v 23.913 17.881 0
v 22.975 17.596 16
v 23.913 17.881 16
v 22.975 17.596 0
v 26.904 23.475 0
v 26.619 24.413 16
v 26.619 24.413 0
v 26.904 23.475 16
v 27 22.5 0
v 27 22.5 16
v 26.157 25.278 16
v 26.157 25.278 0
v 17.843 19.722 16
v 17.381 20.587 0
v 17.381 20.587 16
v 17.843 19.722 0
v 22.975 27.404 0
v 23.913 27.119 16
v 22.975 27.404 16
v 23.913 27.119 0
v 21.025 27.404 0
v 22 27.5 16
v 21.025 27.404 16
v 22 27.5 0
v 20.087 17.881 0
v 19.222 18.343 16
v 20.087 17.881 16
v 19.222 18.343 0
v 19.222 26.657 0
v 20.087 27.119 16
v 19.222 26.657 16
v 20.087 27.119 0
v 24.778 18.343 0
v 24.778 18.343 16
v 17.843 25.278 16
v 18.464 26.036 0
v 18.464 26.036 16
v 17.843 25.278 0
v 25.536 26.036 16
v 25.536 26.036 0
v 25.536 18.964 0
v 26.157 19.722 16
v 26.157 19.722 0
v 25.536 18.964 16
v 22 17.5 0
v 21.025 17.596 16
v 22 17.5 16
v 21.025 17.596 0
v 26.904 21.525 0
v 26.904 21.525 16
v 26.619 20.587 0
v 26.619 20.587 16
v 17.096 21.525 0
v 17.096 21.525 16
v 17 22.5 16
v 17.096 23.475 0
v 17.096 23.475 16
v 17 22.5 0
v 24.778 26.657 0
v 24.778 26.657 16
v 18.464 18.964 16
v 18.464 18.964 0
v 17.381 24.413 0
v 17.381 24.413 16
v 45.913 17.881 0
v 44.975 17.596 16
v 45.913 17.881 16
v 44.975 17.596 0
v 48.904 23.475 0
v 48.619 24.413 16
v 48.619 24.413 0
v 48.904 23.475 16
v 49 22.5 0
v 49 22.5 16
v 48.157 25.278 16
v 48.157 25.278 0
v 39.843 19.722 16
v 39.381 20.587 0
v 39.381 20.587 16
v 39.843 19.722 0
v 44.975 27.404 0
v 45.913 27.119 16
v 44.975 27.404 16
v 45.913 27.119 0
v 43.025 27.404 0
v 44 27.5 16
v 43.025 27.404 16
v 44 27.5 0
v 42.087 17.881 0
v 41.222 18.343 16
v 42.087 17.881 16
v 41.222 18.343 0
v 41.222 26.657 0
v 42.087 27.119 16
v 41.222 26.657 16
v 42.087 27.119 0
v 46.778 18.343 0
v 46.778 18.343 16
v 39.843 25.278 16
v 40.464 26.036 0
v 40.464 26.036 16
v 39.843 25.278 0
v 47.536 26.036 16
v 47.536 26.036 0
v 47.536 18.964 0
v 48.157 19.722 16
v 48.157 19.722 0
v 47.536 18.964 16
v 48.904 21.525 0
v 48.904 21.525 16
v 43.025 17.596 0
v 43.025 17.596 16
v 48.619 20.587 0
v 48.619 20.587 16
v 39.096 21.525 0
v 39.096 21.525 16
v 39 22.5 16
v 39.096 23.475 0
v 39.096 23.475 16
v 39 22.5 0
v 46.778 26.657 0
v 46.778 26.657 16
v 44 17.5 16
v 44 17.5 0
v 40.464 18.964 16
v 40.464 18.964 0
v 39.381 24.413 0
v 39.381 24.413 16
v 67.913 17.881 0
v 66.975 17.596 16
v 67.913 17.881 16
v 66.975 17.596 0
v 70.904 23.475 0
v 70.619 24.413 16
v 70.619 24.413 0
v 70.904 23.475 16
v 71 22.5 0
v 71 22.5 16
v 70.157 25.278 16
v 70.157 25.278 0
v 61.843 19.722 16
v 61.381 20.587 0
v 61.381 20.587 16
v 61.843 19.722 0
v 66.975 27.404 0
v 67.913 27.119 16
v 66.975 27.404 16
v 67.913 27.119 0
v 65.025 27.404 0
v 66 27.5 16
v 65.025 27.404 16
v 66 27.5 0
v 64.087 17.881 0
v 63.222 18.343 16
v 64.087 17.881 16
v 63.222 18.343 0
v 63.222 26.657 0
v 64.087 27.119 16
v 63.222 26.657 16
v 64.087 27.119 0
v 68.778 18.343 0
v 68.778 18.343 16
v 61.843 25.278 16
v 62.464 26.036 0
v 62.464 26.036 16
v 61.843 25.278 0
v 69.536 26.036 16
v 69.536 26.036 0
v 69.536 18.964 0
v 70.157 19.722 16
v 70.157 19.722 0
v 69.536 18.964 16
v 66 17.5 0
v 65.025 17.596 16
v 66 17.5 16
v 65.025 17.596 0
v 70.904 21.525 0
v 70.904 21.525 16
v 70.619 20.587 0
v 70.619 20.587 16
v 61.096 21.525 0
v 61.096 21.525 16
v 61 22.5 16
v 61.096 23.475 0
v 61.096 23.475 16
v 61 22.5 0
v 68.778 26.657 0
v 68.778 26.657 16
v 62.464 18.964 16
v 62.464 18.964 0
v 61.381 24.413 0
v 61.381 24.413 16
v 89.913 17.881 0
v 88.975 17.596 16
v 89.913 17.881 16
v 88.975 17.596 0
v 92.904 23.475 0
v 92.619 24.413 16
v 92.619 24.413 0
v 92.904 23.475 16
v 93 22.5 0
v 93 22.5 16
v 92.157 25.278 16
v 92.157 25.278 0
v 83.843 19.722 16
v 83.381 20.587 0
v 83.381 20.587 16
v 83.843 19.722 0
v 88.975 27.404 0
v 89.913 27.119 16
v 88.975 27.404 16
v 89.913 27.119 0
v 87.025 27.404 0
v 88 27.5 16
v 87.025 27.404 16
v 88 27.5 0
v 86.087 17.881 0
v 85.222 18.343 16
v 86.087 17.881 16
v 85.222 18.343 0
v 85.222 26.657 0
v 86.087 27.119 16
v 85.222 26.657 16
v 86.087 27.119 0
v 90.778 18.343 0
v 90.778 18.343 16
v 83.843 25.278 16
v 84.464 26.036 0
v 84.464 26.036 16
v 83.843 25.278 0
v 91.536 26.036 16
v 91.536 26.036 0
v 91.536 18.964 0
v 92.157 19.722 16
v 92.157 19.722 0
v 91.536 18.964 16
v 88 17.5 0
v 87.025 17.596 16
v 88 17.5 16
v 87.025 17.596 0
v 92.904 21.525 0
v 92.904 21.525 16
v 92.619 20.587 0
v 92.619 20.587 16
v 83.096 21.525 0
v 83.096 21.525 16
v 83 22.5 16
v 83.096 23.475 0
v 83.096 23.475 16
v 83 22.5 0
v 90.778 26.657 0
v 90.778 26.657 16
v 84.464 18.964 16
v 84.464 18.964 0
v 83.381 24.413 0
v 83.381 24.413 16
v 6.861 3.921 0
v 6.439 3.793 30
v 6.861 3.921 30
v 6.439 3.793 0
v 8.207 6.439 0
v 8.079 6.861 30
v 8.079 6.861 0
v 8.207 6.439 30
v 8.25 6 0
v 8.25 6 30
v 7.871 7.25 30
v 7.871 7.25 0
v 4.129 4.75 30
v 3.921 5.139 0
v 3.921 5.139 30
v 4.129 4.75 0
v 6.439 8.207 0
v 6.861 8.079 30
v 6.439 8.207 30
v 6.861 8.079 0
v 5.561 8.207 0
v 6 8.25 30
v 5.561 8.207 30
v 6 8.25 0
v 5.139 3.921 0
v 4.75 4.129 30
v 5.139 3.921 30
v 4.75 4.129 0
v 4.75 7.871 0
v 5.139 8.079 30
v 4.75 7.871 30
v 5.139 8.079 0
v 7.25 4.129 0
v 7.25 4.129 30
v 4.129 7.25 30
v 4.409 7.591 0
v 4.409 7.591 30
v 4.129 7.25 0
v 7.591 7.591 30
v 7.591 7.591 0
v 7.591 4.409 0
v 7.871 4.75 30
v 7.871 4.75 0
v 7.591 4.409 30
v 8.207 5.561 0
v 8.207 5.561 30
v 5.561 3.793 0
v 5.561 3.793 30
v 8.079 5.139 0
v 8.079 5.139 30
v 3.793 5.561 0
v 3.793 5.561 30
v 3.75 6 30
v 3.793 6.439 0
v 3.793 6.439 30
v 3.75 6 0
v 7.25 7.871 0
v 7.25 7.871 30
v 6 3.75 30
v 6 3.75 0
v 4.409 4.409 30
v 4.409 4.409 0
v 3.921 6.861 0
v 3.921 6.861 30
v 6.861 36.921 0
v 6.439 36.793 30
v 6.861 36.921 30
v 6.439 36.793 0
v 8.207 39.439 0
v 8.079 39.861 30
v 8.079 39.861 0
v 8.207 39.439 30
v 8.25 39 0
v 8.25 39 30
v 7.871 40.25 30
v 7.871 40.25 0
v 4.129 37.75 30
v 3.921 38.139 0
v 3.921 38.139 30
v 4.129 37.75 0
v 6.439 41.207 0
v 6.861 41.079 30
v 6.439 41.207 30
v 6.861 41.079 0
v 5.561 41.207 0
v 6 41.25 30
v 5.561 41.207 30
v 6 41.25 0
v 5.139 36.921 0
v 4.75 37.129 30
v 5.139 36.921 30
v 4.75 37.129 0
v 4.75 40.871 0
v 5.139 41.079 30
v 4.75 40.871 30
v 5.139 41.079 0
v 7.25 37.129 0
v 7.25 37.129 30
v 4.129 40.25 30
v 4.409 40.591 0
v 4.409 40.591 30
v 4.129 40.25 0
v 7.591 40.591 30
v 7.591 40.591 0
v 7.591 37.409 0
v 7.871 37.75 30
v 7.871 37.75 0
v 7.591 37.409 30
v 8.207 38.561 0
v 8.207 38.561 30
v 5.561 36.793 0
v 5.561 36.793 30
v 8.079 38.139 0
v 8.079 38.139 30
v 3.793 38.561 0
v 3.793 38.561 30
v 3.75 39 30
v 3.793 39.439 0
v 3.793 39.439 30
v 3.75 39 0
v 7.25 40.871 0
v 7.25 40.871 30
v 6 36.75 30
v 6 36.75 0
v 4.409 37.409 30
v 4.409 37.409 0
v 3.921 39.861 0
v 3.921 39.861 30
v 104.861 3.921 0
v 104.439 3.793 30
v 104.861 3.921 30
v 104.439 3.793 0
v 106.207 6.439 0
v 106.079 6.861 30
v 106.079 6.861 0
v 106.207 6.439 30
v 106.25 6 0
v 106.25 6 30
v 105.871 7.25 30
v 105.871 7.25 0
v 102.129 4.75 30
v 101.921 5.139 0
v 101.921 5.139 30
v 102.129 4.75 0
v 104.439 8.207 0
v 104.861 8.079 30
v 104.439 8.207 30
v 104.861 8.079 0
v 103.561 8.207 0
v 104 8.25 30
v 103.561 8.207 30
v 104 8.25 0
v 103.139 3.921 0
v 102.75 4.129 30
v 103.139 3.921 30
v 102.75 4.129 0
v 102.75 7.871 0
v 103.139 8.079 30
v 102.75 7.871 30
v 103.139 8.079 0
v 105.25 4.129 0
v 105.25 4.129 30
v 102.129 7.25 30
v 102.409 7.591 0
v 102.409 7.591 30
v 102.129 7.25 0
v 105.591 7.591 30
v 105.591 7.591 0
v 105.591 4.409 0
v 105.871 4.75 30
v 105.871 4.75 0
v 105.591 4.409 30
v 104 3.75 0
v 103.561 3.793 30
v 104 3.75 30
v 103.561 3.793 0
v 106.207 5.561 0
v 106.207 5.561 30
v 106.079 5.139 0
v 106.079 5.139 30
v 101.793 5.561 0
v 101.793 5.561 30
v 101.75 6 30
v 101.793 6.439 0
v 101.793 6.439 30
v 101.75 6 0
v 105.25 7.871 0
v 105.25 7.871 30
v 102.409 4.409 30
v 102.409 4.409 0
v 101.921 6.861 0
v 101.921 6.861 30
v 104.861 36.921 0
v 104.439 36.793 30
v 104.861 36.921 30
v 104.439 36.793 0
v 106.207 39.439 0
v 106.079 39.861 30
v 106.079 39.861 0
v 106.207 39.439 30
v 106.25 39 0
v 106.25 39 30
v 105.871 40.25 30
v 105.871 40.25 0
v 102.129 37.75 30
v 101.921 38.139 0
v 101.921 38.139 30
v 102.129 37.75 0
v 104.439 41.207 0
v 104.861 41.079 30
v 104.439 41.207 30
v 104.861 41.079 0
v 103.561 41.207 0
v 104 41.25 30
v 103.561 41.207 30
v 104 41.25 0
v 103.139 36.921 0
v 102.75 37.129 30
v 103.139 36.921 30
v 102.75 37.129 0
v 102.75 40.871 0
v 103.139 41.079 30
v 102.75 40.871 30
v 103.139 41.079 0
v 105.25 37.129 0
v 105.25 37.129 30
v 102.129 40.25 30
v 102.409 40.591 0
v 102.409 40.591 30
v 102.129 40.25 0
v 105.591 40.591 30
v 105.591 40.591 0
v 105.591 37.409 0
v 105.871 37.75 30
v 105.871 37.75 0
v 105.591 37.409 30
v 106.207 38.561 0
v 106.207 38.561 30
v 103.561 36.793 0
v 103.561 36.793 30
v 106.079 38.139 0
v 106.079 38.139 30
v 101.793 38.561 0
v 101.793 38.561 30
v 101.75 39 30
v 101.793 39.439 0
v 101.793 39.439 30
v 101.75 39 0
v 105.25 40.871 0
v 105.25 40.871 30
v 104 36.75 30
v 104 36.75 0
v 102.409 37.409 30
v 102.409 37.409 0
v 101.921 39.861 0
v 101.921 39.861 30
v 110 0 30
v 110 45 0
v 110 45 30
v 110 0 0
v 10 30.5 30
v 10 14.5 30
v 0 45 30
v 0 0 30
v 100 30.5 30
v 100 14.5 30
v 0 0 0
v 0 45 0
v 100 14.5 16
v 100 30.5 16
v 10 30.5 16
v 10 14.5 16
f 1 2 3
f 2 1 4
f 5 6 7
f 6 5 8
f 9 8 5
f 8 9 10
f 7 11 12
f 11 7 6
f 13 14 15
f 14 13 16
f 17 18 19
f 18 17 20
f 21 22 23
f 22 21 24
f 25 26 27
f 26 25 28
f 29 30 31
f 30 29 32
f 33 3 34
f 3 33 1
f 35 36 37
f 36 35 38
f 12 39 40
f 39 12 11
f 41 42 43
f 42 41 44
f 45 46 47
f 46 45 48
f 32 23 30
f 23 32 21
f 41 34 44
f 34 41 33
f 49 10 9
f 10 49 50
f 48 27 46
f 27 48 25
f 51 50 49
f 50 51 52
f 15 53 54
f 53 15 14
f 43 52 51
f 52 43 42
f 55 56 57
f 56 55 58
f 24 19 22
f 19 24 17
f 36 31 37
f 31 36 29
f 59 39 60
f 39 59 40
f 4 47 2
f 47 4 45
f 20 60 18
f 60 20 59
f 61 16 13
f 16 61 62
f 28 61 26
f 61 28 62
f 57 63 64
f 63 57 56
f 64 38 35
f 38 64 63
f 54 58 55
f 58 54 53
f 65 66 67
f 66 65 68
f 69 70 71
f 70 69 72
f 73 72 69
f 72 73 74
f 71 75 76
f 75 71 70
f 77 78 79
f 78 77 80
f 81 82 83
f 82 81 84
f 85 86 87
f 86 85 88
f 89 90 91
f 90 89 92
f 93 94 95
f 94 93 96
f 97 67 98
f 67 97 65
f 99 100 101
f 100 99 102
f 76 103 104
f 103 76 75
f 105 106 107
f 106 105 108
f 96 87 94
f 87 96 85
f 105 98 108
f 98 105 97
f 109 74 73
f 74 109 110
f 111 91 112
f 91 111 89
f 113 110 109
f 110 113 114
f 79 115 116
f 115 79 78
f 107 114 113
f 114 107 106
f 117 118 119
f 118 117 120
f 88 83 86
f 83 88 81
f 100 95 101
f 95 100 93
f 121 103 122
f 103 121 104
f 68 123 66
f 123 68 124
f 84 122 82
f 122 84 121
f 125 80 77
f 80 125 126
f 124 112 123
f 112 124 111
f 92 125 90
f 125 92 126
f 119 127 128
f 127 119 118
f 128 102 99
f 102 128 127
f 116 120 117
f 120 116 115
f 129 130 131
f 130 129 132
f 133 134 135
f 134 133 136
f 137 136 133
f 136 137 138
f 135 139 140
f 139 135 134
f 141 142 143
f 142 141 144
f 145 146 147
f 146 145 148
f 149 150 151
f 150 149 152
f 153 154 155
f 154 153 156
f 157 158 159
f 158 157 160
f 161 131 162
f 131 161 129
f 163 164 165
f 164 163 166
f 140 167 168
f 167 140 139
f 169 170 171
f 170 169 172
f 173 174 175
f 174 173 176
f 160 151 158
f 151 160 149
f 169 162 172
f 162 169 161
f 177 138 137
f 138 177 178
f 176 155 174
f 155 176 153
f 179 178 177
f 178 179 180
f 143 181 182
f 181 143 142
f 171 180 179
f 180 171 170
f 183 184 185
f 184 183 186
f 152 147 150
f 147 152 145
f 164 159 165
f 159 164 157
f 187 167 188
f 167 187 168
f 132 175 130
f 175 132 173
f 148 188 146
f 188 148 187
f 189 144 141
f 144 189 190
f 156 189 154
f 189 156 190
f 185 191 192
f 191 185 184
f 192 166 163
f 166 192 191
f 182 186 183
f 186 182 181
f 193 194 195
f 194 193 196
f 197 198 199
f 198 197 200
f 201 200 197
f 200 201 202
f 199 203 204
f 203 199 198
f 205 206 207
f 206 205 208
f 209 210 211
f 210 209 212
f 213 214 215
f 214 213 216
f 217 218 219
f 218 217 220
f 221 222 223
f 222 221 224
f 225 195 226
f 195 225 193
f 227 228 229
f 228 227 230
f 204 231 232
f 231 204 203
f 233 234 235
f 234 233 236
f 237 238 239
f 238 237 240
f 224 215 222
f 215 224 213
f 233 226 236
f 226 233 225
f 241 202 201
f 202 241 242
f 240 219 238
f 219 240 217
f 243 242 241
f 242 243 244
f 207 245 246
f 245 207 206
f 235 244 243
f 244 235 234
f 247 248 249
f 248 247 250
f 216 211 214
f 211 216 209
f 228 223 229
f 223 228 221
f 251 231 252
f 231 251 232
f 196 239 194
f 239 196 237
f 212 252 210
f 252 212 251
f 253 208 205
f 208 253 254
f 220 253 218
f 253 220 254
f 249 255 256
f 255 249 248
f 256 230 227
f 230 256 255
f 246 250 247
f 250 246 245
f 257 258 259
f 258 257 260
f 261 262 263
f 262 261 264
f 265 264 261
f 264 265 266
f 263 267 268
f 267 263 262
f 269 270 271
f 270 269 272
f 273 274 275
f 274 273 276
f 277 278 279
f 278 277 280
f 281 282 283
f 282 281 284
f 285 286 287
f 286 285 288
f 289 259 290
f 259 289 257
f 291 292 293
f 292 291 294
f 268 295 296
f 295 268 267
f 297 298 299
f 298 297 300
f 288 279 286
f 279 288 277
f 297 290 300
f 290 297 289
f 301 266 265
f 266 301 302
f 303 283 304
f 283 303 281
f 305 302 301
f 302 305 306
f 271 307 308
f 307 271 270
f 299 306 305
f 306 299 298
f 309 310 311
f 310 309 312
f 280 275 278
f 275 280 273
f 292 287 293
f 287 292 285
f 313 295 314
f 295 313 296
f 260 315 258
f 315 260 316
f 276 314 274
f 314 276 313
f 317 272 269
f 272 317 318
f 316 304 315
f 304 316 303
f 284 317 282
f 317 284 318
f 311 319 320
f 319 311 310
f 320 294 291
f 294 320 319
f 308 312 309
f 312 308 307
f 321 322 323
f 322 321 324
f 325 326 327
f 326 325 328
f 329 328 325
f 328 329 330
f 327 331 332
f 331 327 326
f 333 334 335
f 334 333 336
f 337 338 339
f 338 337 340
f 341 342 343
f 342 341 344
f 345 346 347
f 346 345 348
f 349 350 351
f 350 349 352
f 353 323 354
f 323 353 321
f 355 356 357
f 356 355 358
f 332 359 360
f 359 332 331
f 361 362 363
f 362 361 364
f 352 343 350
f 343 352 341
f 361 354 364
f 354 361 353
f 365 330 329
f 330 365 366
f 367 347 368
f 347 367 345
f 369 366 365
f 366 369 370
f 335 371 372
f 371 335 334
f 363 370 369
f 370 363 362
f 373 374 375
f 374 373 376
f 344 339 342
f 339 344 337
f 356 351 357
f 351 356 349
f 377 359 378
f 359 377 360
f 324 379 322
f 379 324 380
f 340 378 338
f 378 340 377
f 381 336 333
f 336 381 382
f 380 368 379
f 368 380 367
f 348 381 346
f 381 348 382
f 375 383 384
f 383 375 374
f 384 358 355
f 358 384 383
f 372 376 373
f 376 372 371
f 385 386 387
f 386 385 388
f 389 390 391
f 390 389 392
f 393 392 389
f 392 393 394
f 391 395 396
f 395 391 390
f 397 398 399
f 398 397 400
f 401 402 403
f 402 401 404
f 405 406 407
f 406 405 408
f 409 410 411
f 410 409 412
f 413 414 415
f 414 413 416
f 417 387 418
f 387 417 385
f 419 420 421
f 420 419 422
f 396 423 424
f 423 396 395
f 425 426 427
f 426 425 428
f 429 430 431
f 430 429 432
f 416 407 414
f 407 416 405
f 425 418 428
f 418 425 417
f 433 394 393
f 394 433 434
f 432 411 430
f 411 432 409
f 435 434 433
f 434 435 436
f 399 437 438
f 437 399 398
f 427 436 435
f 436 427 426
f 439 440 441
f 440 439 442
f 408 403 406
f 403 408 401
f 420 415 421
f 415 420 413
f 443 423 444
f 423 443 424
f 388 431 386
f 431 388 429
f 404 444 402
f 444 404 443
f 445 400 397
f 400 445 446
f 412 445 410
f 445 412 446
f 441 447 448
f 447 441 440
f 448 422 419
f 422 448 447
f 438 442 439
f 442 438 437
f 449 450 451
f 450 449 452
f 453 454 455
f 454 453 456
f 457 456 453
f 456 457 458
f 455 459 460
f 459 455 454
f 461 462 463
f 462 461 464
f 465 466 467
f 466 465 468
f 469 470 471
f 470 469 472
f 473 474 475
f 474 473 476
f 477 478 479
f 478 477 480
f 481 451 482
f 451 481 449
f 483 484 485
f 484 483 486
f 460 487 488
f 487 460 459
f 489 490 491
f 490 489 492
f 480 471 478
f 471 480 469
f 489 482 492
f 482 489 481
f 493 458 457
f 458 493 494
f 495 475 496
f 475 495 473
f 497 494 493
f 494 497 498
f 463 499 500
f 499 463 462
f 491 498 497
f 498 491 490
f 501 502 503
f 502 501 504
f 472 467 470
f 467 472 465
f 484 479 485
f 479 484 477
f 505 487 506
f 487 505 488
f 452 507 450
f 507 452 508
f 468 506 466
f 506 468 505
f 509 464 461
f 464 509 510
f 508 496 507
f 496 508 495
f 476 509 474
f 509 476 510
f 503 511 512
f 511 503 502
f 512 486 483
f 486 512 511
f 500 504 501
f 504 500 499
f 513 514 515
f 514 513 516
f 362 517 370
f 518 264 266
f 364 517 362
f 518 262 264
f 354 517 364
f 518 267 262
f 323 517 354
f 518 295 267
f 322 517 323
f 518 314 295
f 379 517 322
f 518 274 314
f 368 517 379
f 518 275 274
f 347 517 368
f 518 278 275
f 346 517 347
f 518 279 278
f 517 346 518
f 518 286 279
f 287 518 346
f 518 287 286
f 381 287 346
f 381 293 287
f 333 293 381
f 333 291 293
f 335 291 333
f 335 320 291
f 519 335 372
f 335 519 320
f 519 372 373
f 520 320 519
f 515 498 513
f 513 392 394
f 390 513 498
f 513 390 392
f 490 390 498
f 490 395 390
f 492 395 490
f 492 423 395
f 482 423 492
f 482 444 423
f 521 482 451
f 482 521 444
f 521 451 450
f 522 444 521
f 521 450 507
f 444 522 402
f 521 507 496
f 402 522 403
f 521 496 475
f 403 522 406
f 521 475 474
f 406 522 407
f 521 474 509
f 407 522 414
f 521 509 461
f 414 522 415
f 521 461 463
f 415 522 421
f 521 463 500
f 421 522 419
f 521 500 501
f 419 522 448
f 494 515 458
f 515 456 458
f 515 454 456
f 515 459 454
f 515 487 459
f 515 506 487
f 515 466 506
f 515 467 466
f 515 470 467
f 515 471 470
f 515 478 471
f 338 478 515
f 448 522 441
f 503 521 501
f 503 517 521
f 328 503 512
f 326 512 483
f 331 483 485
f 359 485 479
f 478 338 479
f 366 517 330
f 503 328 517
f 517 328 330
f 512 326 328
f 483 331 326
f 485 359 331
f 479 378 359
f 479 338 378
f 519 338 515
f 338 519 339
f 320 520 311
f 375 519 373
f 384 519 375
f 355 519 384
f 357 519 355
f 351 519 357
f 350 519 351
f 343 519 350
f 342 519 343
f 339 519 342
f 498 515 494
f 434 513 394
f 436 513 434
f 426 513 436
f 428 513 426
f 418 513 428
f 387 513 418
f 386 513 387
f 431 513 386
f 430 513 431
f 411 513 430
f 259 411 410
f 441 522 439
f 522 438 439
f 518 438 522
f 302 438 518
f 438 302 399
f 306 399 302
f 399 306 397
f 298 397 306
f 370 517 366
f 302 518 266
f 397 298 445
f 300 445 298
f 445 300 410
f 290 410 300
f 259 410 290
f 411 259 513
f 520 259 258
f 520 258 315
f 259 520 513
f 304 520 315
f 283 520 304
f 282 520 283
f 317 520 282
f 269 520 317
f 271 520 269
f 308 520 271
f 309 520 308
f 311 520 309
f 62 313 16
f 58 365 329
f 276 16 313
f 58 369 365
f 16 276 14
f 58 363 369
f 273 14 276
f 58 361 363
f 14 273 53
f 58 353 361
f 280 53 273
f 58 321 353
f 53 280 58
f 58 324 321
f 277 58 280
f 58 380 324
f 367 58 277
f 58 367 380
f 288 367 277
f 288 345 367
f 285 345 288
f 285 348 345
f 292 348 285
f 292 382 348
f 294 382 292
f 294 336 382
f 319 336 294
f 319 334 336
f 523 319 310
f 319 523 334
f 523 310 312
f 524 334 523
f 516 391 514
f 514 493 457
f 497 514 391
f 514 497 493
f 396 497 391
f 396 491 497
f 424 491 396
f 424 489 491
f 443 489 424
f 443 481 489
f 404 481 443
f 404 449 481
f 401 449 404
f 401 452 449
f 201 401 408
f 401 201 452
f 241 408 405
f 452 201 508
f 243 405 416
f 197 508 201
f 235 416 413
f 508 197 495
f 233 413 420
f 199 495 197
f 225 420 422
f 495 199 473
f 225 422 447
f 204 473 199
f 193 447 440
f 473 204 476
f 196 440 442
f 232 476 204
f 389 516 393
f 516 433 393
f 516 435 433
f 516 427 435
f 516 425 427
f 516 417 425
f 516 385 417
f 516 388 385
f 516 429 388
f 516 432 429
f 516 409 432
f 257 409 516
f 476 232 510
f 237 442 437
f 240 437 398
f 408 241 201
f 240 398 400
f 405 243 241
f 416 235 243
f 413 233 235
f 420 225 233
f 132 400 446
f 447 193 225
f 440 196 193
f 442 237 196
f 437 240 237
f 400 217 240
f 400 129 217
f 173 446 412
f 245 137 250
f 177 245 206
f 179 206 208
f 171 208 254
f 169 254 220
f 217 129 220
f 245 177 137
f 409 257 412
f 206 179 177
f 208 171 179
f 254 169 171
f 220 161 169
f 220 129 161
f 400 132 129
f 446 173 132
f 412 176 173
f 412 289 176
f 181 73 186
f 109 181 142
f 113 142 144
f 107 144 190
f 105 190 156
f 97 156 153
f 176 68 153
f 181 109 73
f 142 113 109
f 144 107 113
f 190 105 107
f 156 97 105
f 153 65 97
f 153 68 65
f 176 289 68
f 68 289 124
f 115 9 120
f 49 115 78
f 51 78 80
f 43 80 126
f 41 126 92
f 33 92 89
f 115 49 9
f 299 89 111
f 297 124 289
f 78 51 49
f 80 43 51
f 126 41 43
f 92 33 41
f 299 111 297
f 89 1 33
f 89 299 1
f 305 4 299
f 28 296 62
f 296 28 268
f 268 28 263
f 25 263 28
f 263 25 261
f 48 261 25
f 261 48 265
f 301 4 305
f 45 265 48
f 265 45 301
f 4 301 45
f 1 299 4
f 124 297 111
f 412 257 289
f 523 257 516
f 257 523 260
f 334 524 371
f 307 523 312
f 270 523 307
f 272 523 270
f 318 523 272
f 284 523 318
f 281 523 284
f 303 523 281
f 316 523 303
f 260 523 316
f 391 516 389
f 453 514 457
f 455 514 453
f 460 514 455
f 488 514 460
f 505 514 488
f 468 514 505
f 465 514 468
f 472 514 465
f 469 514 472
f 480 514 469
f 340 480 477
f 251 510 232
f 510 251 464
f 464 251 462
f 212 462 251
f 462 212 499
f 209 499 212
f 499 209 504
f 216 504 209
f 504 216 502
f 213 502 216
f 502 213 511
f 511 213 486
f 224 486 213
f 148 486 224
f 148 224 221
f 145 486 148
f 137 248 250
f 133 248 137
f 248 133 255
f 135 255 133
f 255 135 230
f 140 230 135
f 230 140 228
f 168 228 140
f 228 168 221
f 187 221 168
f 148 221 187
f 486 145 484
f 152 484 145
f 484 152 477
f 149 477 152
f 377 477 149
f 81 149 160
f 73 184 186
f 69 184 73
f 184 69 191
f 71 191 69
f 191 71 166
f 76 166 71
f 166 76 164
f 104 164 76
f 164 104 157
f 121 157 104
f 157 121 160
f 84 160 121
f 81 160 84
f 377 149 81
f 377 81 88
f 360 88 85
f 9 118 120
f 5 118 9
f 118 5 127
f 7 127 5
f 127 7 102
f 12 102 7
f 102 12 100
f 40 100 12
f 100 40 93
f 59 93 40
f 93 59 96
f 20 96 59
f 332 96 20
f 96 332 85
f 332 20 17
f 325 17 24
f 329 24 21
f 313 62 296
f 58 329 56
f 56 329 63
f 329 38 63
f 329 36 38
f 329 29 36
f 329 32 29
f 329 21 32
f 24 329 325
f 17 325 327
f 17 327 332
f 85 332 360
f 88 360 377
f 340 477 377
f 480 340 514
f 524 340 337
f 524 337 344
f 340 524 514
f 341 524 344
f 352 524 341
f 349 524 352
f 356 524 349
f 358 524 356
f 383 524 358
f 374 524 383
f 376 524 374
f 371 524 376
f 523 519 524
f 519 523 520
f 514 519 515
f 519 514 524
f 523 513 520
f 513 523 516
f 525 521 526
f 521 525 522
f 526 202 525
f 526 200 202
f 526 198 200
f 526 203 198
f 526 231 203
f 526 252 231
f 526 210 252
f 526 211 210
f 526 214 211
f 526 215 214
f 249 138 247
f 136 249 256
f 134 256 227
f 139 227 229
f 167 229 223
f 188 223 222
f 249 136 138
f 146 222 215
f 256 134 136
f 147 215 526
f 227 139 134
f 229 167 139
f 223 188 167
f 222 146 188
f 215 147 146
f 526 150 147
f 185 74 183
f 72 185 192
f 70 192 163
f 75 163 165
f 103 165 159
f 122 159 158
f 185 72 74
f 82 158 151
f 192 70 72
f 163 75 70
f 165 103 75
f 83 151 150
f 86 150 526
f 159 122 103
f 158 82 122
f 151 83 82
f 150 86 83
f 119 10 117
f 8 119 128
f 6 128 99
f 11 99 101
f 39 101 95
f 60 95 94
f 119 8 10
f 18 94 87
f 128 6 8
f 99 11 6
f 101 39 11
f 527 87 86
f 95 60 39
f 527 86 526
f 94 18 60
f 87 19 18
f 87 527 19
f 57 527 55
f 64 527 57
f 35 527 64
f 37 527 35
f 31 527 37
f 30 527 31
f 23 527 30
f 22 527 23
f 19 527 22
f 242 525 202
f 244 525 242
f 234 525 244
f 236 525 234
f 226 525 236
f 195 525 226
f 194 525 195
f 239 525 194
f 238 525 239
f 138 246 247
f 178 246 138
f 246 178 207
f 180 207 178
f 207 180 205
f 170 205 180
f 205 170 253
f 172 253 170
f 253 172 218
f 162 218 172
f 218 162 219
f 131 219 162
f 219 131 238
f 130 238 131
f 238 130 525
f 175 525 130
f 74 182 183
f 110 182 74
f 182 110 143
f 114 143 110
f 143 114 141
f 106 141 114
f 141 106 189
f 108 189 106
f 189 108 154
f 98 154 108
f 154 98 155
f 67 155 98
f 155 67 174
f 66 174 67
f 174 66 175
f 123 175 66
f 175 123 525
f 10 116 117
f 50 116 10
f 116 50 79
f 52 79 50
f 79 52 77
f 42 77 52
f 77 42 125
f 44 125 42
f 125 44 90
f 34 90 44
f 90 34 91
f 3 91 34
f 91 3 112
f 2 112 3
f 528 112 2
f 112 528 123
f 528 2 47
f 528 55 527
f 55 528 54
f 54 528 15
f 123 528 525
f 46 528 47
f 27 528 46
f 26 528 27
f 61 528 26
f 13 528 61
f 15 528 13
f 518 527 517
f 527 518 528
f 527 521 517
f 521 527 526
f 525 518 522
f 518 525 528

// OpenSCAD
$fn = 32;

// ----------------------------------------------------------------------
// Manifold block: gallery_top manifold
// ----------------------------------------------------------------------

// --- parameters (mm) ---
block_l = 110;            // block length, X
block_w = 45;             // block width, Y
block_h = 30;             // block height, Z
port_d = 10;              // port bore diameter
port_pitch = 22;          // port pitch along X
gallery_d = 16;           // top gallery width, Y
gallery_depth = 14;       // gallery pocket depth
wall_p = 10;              // gallery end wall thickness, X
mnt_d = 4.5;              // mounting hole diameter
mnt_in = 6;               // mounting hole inset from the edges

n_ports = 4;  // ports in the row
port_x0 = (block_l - (n_ports - 1) * port_pitch) / 2;  // first port X

difference() {
  cube([block_l, block_w, block_h]);
  for (i = [0 : n_ports - 1])
    translate([port_x0 + i * port_pitch, block_w / 2, -1])
      cylinder(h = block_h + 2, d = port_d);
  translate([wall_p, block_w / 2 - gallery_d / 2, block_h - gallery_depth])
    cube([block_l - 2 * wall_p, gallery_d, gallery_depth + 1]);
  for (cx = [mnt_in, block_l - mnt_in])
    for (cy = [mnt_in, block_w - mnt_in])
      translate([cx, cy, -1]) cylinder(h = block_h + 2, d = mnt_d);
}
